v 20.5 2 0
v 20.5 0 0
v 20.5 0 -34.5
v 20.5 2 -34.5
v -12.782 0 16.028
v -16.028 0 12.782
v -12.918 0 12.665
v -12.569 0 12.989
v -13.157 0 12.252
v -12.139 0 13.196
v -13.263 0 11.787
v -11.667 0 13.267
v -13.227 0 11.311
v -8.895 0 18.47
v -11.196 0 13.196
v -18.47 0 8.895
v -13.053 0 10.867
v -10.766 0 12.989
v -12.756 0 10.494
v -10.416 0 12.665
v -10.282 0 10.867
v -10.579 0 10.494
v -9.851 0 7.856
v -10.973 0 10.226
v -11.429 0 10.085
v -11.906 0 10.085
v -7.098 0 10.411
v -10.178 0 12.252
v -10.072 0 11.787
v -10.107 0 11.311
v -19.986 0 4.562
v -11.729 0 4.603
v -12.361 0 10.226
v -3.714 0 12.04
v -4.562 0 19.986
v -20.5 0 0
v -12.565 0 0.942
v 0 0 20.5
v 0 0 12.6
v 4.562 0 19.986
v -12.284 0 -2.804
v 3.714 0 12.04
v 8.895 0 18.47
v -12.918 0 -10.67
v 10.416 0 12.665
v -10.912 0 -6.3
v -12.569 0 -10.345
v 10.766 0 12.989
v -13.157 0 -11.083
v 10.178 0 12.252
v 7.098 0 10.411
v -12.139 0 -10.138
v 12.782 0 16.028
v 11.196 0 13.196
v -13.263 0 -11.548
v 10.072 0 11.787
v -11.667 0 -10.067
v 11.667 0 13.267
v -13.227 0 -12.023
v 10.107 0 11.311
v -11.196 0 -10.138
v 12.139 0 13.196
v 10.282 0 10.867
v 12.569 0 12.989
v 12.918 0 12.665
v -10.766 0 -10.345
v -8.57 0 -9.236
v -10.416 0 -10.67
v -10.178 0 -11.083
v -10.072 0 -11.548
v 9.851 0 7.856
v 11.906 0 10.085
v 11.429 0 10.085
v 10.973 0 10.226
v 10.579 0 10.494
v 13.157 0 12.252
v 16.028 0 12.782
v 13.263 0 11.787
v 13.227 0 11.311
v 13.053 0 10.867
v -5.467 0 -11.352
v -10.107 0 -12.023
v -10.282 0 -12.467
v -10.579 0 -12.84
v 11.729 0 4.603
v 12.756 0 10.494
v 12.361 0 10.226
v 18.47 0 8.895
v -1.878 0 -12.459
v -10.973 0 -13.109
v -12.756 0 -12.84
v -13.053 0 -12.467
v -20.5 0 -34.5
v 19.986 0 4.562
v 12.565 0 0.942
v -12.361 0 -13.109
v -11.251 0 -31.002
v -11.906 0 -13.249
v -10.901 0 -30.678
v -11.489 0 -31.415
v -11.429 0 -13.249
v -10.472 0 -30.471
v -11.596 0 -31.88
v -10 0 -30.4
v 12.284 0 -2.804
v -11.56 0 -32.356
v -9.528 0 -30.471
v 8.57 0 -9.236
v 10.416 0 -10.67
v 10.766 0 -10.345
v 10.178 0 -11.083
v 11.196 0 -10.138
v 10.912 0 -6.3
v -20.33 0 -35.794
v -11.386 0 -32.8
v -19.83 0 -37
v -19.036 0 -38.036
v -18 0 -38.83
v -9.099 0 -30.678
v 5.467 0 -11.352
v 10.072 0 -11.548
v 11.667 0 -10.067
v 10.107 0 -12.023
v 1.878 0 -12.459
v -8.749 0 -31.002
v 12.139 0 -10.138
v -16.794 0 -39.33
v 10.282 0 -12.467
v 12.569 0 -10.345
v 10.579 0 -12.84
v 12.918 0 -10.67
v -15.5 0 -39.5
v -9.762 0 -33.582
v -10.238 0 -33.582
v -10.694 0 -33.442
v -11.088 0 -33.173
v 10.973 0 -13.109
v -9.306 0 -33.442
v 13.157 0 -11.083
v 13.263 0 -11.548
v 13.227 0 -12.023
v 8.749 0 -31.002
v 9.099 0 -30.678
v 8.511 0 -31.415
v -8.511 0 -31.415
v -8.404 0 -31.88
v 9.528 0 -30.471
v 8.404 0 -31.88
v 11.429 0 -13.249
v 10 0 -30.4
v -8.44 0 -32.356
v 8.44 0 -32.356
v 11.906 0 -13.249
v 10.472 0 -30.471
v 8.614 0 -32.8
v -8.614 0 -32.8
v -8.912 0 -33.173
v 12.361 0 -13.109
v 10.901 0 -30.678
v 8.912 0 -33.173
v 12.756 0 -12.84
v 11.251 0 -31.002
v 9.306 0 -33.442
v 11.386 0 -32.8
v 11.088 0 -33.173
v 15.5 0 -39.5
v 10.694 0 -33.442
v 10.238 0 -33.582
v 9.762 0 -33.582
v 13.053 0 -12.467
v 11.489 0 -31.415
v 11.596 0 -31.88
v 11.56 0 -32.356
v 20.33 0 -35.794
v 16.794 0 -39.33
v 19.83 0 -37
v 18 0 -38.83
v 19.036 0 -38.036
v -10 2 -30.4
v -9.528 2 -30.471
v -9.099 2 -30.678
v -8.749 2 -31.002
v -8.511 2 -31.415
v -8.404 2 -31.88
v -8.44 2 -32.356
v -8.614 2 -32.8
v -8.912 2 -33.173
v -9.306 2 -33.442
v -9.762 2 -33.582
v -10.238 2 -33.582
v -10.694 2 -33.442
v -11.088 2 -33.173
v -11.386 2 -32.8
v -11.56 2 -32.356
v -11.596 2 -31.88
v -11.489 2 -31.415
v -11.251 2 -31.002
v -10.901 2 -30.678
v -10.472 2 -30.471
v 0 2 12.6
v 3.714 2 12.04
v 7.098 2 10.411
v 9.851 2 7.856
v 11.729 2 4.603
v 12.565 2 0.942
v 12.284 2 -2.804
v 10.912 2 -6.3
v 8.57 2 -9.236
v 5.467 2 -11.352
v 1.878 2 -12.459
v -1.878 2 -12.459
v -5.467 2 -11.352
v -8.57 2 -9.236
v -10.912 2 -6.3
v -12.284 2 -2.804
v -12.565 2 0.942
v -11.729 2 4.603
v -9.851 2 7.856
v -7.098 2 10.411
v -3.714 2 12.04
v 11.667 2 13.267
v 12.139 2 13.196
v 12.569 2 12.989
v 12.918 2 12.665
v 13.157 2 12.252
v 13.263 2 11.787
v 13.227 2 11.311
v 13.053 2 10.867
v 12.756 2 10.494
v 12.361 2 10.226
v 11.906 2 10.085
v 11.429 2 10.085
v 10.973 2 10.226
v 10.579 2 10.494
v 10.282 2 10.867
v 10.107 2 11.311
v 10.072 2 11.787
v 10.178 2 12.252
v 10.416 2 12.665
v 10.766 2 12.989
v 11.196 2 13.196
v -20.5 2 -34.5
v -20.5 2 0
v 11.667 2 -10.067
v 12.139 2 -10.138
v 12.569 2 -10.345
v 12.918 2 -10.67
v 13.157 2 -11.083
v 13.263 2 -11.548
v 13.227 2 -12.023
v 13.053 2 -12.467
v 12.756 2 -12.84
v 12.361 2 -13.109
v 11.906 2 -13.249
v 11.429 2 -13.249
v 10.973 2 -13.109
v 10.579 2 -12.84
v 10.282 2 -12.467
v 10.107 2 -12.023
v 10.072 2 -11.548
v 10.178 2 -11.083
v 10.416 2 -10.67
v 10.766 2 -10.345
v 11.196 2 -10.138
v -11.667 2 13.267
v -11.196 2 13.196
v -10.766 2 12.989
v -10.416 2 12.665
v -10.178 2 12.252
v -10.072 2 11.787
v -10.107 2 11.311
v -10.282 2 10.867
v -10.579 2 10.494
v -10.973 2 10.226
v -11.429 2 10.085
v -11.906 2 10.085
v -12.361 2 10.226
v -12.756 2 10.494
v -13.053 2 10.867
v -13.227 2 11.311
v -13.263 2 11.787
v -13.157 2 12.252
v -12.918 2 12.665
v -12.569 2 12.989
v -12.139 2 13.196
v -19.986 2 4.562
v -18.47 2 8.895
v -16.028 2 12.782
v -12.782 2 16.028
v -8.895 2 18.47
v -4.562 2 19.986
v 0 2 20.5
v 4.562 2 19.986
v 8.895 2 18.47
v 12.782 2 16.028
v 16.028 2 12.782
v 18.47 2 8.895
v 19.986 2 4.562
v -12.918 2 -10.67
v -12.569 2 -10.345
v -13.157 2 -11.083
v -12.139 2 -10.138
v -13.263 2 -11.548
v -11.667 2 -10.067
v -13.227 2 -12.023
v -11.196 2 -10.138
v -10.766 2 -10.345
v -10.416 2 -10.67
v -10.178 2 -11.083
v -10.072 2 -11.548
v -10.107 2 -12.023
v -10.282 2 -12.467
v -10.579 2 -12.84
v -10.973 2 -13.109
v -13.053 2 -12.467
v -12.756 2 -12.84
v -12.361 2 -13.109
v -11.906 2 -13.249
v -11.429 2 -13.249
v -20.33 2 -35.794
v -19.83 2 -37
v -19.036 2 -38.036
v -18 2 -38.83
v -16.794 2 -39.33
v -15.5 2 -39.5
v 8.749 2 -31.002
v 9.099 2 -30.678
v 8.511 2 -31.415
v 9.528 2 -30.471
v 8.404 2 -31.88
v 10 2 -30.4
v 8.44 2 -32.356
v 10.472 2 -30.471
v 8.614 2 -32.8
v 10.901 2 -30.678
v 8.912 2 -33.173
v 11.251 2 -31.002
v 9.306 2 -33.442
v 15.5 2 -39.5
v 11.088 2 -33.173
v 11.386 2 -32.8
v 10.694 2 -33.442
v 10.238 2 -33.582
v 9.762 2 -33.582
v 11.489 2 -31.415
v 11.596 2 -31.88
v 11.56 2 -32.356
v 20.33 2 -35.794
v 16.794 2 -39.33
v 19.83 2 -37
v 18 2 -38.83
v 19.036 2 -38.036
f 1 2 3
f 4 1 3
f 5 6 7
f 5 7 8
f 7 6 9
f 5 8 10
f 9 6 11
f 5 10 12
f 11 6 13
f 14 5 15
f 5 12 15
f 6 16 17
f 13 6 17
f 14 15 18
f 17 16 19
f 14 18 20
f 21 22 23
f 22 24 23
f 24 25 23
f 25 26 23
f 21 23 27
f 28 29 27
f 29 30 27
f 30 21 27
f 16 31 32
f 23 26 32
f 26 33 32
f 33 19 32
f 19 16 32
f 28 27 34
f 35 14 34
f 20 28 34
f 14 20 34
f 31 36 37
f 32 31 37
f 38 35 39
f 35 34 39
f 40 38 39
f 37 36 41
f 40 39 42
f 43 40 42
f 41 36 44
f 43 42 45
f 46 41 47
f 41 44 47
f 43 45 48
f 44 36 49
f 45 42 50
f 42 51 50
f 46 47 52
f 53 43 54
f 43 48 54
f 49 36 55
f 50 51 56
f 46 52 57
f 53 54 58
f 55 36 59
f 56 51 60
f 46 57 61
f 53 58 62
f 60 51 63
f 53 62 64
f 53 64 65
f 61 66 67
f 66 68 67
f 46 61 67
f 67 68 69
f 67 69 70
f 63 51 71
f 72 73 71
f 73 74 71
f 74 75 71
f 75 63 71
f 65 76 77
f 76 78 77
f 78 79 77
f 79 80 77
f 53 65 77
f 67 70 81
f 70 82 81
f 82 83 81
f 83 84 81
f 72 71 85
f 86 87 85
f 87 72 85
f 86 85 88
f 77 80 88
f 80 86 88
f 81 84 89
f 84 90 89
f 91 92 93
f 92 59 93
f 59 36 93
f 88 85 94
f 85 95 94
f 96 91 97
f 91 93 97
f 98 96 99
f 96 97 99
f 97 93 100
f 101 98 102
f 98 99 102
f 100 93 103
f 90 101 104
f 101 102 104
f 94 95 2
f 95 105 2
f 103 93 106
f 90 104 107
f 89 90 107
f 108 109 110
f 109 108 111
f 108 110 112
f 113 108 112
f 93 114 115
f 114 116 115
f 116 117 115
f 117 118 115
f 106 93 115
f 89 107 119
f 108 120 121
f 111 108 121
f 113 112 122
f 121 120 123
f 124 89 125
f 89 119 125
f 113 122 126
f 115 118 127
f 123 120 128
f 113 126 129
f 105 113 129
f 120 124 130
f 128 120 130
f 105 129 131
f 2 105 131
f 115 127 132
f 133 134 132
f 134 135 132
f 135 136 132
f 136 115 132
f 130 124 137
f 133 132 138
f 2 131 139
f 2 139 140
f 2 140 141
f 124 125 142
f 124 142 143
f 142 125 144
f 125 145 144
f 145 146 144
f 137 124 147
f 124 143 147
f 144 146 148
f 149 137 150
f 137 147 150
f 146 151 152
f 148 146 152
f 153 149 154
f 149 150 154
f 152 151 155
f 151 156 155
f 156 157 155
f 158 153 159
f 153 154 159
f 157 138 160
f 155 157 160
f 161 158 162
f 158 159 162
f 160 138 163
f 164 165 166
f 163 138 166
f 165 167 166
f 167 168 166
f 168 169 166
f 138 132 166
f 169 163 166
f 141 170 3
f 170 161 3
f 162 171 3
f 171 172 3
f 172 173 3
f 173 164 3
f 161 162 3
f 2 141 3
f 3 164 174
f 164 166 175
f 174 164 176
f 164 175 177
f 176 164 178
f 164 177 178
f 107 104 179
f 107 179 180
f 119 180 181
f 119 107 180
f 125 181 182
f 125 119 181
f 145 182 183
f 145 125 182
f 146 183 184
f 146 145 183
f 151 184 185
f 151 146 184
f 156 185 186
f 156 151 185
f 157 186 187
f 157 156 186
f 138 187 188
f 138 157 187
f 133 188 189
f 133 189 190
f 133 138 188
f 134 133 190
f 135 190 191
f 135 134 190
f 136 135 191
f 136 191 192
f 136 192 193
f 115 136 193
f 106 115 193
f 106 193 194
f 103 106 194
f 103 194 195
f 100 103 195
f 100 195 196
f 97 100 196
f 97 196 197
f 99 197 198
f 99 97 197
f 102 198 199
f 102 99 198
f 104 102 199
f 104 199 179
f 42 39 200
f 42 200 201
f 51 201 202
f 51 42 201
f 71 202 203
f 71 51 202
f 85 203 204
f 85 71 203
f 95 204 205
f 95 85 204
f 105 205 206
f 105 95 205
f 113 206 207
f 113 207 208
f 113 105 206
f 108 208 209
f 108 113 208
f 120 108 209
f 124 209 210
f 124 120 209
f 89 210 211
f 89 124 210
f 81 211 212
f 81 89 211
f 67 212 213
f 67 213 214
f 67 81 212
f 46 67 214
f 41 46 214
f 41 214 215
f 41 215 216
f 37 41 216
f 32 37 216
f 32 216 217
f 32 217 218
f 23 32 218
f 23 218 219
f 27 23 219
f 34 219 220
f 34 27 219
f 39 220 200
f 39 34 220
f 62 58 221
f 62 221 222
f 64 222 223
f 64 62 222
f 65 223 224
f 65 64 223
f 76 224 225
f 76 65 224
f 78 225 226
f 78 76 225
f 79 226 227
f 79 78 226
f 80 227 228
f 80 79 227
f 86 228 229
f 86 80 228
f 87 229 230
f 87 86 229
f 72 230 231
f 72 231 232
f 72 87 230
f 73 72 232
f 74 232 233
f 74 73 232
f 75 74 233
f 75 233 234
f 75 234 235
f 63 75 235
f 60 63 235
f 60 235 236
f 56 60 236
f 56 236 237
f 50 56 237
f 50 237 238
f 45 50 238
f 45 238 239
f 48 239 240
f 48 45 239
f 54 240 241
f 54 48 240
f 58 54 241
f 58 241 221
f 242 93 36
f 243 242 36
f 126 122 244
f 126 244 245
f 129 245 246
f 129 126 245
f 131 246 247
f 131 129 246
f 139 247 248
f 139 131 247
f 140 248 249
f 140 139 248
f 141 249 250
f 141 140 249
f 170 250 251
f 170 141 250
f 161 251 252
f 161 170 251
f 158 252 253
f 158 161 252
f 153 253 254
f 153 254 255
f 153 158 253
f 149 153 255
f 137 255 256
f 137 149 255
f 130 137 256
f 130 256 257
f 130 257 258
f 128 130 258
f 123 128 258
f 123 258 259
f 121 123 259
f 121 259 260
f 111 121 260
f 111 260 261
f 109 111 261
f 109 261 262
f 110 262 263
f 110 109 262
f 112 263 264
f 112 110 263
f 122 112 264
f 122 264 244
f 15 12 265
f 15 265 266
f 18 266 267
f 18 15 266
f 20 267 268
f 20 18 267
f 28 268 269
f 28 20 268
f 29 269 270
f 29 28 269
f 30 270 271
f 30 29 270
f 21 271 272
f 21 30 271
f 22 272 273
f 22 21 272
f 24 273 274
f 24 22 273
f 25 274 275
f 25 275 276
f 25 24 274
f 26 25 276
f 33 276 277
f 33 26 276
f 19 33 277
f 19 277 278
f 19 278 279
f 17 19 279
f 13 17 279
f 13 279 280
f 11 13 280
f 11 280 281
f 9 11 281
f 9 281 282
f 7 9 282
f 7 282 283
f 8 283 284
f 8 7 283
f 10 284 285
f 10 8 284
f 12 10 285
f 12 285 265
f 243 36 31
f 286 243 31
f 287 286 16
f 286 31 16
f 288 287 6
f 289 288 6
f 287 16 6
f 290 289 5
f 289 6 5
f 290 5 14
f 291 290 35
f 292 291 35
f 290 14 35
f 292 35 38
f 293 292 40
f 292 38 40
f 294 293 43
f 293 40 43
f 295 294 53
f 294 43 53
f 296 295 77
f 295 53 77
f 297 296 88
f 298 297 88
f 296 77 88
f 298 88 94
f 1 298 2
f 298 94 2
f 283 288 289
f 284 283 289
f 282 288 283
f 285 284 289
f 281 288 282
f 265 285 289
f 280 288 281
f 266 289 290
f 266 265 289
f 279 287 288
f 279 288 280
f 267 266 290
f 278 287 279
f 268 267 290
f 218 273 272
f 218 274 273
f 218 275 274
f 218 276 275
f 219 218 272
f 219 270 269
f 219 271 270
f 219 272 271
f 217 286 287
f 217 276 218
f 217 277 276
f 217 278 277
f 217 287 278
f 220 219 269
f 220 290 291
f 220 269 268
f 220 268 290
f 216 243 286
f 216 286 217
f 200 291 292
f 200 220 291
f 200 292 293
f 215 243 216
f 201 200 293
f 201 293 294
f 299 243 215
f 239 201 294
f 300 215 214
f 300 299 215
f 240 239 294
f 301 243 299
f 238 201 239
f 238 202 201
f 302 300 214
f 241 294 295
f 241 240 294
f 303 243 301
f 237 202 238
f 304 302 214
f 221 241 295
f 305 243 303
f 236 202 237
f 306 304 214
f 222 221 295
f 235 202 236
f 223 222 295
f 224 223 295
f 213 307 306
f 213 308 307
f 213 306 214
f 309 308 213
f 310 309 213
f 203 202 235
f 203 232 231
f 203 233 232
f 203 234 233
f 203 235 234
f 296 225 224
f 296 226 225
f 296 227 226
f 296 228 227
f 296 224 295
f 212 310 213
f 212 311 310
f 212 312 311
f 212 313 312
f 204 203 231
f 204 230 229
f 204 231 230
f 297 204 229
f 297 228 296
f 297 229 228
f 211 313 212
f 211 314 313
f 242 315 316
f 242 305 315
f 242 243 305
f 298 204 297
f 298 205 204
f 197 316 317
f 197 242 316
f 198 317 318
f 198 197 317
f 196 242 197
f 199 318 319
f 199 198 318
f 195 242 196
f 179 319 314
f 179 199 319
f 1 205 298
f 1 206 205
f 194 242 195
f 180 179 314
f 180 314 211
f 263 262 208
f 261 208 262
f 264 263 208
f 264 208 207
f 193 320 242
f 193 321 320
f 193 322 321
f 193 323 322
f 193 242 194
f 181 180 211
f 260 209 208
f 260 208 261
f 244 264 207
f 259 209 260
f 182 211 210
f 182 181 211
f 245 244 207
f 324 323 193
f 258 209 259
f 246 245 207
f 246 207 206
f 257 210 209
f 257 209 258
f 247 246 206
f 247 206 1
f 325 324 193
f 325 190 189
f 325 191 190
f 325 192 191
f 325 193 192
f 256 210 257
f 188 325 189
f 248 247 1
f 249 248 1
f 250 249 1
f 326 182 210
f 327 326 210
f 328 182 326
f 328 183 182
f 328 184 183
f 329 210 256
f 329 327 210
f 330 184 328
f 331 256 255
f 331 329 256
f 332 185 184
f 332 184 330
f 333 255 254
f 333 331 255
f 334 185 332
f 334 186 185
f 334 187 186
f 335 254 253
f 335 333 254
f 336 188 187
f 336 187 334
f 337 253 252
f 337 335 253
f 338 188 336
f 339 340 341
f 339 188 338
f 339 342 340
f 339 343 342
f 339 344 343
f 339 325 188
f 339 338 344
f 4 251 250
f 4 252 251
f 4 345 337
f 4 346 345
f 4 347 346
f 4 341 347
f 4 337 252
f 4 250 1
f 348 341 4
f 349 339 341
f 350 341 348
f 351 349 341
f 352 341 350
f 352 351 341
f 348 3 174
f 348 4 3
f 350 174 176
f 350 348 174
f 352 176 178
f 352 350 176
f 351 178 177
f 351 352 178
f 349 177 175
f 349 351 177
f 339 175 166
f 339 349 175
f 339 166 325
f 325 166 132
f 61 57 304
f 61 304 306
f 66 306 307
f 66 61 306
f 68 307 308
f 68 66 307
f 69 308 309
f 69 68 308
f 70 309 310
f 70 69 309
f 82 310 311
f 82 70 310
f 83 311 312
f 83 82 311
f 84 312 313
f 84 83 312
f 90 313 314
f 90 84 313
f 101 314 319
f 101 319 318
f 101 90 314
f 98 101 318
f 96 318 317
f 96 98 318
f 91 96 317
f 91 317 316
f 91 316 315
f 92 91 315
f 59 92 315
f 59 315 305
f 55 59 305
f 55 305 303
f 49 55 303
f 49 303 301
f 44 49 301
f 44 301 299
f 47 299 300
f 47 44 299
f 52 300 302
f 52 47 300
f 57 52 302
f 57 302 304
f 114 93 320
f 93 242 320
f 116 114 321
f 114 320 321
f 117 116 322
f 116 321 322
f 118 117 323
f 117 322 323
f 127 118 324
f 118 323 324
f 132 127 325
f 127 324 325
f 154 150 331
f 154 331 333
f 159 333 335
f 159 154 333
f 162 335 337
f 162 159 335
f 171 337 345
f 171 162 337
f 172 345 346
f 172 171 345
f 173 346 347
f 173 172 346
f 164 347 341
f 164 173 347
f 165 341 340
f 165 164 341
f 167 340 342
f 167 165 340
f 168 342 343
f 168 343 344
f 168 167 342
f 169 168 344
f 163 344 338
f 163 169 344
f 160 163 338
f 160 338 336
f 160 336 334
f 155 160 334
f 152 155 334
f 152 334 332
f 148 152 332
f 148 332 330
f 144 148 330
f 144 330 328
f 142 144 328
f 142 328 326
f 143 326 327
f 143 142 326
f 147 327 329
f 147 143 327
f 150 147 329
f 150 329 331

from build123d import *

# Parameters (mm, degrees)
SKETCH_1_R      = 1.6
SKETCH_1_R_2    = 20.5
SKETCH_1_R_3    = 12.6
EXTRUDE_1_DEPTH = 2
FILLET_1_R      = 5


with BuildPart() as part:
    # 草图1 → 凸台-拉伸1 (new body)
    # profile 1 of 2: a face of its own
    with BuildSketch(Plane(origin=(0, 0, 0), x_dir=(1, 0, 0), z_dir=(0, 1, 0))):
        with BuildLine():
            Line((-20.5, 39.5), (-20.5, 0))
            ThreePointArc((-20.5, 0), (0, 20.5), (20.5, 0))
            Line((20.5, 0), (20.5, 39.5))
            Line((20.5, 39.5), (-20.5, 39.5))
        make_face()
        with Locations(Location((-10, 32, 0), (0, 0, 270))):
            Circle(SKETCH_1_R, mode=Mode.SUBTRACT)
        with Locations(Location((10, 32, 0), (0, 0, 270))):
            Circle(SKETCH_1_R, mode=Mode.SUBTRACT)
    # profile 2 of 2: a face of its own
    with BuildSketch(Plane(origin=(0, 0, 0), x_dir=(1, 0, 0), z_dir=(0, 1, 0))):
        Circle(SKETCH_1_R_2)
        with Locations(Location((11.66726189, -11.66726189, 0), (0, 0, 270))):
            Circle(SKETCH_1_R, mode=Mode.SUBTRACT)
        with Locations(Location((11.66726189, 11.66726189, 0), (0, 0, 270))):
            Circle(SKETCH_1_R, mode=Mode.SUBTRACT)
        with Locations(Location((-11.66726189, 11.66726189, 0), (0, 0, 270))):
            Circle(SKETCH_1_R, mode=Mode.SUBTRACT)
        with Locations(Location((-11.66726189, -11.66726189, 0), (0, 0, 270))):
            Circle(SKETCH_1_R, mode=Mode.SUBTRACT)
        with Locations(Location((0, 0, 0), (0, 0, 270))):
            Circle(SKETCH_1_R_3, mode=Mode.SUBTRACT)
    extrude(amount=EXTRUDE_1_DEPTH)

    # 圆角1
    fillet_1_edges = [part.edges().sort_by_distance(p)[0] for p in [
        (-20.5, 1, -39.5),
        (20.5, 1, -39.5),
    ]]
    fillet(fillet_1_edges, radius=FILLET_1_R)


solid = part.part
